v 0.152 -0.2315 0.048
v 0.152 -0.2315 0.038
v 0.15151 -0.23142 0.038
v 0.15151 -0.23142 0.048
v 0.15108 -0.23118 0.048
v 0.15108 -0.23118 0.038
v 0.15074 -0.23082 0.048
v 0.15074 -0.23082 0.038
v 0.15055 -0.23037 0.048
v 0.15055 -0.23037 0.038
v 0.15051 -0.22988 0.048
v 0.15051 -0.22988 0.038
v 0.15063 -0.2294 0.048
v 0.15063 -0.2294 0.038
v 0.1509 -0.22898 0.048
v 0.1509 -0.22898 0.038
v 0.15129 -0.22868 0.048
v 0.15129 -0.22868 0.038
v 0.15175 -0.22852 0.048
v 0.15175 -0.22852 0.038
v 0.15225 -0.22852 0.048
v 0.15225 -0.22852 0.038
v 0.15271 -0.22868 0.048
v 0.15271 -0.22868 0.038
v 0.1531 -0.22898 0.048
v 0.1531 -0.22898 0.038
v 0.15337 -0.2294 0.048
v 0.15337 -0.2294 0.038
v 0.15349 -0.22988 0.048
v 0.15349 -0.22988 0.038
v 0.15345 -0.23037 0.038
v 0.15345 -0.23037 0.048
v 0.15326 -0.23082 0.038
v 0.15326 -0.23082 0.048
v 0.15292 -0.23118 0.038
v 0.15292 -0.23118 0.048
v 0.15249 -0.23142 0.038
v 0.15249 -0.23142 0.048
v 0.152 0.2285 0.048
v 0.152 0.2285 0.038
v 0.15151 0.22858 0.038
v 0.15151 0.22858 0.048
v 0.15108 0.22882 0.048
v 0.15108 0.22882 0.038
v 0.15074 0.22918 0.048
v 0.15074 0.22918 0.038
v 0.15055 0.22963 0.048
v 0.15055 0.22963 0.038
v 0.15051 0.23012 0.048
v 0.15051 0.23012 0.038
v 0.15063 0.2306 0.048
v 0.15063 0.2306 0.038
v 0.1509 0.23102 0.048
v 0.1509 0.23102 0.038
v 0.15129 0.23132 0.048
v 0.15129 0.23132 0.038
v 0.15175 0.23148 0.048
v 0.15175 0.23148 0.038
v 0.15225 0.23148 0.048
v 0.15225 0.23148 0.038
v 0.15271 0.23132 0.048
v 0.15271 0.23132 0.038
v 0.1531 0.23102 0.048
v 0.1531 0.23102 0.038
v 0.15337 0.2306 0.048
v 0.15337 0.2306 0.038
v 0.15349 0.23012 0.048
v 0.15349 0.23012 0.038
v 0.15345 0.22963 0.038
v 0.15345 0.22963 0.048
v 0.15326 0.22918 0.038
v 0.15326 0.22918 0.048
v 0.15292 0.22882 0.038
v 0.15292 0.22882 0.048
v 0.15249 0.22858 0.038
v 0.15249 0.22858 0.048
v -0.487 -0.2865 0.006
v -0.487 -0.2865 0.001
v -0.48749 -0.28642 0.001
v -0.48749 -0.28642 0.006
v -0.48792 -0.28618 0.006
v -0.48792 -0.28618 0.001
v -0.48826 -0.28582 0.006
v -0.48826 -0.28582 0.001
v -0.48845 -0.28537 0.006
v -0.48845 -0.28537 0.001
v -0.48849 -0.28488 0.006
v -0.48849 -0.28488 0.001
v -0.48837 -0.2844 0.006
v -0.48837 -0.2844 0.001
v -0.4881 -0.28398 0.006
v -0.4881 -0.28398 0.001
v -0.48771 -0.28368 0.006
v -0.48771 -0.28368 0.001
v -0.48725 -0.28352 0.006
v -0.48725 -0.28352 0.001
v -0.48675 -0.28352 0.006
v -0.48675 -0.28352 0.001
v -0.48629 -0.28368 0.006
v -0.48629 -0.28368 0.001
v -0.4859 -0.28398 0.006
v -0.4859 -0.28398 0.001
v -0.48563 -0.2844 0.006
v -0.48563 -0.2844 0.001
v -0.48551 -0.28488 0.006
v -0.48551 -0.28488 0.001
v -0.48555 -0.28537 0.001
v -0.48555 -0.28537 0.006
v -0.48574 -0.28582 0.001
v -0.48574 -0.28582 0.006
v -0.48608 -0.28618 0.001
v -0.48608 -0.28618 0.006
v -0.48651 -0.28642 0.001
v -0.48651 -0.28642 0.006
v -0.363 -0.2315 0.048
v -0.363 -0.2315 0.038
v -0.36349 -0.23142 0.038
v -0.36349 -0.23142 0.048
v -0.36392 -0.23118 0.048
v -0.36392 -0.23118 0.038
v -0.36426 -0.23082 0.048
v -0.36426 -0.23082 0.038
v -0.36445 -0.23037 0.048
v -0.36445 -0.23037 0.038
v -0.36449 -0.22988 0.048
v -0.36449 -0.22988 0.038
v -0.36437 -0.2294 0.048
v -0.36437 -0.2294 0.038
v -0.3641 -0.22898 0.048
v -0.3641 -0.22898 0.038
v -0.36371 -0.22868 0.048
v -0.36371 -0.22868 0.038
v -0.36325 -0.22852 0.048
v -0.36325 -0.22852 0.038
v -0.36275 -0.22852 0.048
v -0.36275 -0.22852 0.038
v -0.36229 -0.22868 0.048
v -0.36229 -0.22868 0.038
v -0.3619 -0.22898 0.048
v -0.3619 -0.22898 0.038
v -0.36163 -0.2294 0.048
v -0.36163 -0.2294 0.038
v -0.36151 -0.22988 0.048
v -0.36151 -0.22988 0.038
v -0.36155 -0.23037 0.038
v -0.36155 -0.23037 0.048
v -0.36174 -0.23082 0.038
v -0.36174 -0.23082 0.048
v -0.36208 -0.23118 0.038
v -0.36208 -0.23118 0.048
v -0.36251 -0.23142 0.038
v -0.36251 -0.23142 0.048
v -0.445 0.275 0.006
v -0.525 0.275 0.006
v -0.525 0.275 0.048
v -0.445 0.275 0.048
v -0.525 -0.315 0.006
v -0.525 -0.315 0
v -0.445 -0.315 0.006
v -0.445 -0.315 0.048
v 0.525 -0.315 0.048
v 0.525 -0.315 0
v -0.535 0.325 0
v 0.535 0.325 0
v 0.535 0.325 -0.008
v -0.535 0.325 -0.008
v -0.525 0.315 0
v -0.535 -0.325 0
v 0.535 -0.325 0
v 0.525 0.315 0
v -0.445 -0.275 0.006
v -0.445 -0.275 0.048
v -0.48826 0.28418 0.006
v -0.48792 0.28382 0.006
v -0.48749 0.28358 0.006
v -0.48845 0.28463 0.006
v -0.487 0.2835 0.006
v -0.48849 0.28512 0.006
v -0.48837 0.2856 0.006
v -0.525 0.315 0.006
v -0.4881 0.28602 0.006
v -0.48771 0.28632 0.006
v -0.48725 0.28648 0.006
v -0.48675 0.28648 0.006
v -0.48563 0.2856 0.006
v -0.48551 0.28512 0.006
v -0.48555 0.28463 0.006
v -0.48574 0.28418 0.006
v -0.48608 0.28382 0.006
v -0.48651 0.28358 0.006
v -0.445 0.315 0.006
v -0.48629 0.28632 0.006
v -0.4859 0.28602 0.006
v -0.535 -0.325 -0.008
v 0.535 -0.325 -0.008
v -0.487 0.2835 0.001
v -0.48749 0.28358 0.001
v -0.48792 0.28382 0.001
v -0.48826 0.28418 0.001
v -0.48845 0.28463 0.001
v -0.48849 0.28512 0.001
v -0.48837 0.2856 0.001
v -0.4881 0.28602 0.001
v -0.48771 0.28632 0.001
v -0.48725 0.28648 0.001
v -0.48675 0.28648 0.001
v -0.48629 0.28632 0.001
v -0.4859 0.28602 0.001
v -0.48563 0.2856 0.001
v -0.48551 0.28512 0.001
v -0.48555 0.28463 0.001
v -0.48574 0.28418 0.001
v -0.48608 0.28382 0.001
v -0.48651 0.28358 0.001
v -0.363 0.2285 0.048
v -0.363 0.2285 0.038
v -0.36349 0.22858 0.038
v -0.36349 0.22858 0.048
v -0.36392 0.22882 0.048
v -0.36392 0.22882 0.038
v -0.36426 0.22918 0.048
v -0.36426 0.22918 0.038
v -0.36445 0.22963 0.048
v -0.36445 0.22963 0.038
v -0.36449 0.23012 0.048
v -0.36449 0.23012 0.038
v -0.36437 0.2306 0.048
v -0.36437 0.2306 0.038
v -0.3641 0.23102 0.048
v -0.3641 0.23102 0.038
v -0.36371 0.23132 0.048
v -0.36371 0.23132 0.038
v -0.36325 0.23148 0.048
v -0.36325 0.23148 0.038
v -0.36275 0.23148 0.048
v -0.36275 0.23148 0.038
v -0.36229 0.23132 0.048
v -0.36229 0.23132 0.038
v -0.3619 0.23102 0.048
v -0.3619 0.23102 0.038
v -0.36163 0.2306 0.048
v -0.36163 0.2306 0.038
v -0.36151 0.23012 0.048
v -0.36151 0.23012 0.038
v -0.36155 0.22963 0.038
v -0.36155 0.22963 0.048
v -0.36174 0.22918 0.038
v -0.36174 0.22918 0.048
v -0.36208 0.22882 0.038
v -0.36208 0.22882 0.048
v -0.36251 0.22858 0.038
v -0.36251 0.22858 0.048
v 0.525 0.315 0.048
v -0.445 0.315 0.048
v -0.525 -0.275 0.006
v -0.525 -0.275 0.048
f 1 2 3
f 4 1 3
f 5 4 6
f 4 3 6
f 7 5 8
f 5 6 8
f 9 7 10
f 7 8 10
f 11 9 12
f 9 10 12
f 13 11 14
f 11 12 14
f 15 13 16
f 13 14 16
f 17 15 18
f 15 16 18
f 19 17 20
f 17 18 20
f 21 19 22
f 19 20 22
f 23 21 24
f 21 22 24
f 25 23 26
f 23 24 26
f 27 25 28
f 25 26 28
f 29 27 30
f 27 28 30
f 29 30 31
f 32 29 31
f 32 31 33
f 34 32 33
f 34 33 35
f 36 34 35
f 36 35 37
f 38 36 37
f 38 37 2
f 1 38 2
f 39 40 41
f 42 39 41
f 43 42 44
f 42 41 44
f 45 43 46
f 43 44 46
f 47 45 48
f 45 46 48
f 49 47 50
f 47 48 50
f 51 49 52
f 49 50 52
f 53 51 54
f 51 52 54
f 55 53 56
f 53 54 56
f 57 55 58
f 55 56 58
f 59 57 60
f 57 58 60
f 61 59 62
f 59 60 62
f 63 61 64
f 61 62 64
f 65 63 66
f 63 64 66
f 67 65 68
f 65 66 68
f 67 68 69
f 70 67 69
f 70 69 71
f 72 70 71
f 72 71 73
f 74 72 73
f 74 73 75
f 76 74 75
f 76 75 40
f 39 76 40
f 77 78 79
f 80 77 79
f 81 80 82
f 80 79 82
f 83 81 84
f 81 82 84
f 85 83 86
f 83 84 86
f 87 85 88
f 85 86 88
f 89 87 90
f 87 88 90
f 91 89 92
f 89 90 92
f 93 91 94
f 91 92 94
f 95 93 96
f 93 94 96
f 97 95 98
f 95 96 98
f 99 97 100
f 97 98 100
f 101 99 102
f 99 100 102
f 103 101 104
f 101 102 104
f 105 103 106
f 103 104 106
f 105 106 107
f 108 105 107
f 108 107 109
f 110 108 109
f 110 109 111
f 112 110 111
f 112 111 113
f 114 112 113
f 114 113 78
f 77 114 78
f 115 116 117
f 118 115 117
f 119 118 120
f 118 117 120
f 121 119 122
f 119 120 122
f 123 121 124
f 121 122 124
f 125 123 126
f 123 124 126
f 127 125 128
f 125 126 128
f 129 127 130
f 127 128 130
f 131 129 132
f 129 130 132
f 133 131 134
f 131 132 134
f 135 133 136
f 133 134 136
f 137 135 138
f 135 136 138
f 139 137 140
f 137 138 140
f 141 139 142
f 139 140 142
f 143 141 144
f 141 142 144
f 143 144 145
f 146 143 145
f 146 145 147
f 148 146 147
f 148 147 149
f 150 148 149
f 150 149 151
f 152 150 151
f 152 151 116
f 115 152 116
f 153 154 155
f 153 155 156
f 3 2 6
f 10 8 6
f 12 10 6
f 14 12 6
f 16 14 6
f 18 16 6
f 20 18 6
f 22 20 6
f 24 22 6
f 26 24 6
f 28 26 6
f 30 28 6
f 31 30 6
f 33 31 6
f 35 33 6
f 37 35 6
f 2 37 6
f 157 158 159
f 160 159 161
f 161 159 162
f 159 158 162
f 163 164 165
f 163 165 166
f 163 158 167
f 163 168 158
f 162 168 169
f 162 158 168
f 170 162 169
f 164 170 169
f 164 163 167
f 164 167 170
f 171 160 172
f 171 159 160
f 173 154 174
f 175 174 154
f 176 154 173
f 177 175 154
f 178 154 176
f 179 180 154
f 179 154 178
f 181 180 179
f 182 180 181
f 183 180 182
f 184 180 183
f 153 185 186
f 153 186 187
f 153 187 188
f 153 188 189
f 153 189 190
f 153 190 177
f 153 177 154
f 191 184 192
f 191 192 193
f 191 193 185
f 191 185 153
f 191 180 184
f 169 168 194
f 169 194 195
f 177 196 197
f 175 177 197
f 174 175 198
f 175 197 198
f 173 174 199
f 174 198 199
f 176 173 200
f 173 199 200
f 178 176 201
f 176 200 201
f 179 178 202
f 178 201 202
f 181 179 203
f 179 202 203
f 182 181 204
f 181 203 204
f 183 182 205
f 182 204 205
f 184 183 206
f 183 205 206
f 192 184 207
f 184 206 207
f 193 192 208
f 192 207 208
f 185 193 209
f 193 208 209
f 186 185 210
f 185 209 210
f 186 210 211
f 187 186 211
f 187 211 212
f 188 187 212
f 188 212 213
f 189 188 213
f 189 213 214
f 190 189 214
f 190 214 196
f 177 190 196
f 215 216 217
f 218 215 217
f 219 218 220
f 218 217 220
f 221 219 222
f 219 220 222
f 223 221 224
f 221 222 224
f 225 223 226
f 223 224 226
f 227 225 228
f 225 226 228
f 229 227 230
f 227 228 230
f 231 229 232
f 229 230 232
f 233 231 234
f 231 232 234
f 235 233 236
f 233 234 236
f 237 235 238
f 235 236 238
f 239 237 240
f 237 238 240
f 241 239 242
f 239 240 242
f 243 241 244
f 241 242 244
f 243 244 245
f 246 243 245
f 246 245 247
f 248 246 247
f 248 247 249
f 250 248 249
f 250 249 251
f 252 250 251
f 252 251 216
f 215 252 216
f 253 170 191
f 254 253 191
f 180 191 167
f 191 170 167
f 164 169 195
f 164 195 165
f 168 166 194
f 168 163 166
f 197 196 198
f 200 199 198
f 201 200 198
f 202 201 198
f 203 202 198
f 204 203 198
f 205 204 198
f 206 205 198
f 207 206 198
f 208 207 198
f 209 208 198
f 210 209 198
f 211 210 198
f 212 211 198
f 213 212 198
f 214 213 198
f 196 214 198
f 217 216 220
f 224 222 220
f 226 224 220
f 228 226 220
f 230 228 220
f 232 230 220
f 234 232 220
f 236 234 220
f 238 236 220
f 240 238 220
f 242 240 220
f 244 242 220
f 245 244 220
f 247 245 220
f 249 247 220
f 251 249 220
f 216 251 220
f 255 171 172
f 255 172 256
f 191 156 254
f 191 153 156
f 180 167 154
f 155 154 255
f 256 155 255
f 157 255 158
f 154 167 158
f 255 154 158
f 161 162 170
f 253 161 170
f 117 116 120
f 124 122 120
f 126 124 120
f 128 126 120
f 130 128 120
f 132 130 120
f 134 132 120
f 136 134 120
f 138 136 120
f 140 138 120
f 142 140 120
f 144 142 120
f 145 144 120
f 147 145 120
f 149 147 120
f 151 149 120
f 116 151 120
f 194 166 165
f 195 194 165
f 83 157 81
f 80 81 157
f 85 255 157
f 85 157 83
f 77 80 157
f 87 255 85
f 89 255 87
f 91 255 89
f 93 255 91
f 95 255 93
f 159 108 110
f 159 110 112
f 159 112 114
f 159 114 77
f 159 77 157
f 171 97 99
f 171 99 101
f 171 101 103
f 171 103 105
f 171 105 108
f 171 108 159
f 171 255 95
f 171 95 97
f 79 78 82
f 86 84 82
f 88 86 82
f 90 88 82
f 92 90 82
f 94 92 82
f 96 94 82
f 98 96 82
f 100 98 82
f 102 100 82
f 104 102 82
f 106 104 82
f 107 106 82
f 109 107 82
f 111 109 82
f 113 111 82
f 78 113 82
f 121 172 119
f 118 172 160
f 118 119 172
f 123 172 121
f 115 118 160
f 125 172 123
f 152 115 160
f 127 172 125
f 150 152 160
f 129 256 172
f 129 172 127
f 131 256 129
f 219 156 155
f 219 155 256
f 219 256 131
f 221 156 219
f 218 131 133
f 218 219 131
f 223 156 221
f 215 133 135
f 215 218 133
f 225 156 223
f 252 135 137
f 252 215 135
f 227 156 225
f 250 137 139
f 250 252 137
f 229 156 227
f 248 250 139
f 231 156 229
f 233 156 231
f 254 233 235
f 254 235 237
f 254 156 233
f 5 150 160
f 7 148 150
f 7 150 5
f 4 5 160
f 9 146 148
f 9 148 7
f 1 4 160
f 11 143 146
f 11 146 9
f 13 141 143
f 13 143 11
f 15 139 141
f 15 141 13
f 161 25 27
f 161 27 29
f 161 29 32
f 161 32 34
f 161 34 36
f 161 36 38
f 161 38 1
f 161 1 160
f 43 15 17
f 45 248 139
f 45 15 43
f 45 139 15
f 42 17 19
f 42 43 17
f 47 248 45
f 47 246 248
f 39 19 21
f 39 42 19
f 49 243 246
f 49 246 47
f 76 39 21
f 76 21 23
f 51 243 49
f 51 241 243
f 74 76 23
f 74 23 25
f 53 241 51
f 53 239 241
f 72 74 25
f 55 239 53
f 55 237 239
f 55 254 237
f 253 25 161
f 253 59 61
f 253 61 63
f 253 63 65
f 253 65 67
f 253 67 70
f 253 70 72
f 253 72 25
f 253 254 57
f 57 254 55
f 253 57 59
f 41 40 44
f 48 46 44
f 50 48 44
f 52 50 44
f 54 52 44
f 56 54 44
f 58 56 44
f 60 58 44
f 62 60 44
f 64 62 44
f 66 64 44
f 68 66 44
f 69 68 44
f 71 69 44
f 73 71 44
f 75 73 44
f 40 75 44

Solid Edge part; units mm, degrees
sketch "Sketch1" plane through (0, 0, 0) normal (0, 0, 1) x (1, 0, 0)
  line L0 (-0.525, -0.315) -> (0.525, -0.315)
  line L1 (0.525, -0.315) -> (0.525, 0.315)
  line L2 (0.525, 0.315) -> (-0.525, 0.315)
  line L3 (-0.525, 0.315) -> (-0.525, -0.315)
  dimension "D1" = 0.63
  dimension "D2" = 1.05
extrude "Protrusion1" add sketch "Sketch1" along normal blind 0.006
sketch "Sketch2" plane through (0, 0, 0) normal (0, 0, -1) x (1, 0, 0)
  line L0 (-0.535, -0.325) -> (-0.535, 0.325)
  line L1 (-0.535, 0.325) -> (0.535, 0.325)
  line L2 (0.535, 0.325) -> (0.535, -0.325)
  line L3 (0.535, -0.325) -> (-0.535, -0.325)
extrude "Ausprägung_3" add sketch "Sketch2" along normal blind 0.008
sketch "Sketch3" plane through (0, 0, 0.006) normal (0, 0, 1) x (1, 0, 0)
  line L0 (-0.525, 0.275) -> (-0.525, -0.275)
  line L1 (-0.445, -0.275) -> (-0.525, -0.275)
  line L2 (-0.445, -0.315) -> (-0.445, -0.275)
  line L3 (-0.445, -0.315) -> (0.525, -0.315)
  line L4 (0.525, -0.315) -> (0.525, 0.315)
  line L5 (0.525, 0.315) -> (-0.445, 0.315)
  line L6 (-0.445, 0.275) -> (-0.445, 0.315)
  line L7 (-0.525, 0.275) -> (-0.445, 0.275)
  dimension "D1" = 0.04
  dimension "D2" = 0.08
extrude "Ausprägung_4" add sketch "Sketch3" along normal blind 0.042
hole "Bohrung_1" at (-0.487, -0.285, 0.006) direction (0, 0, -1) diameter 0.003 depth 0.005
hole "Hole1" at (-0.487, 0.285, 0.006) direction (0, 0, -1) diameter 0.003 depth 0.005
hole "Bohrung_3" at (-0.363, 0.23, 0.048) direction (0, 0, -1) diameter 0.003 depth 0.01
hole "Hole2" at (0.152, 0.23, 0.048) direction (0, 0, -1) diameter 0.003 depth 0.01
hole "Hole3" at (0.152, -0.23, 0.048) direction (0, 0, -1) diameter 0.003 depth 0.01
hole "Hole4" at (-0.363, -0.23, 0.048) direction (0, 0, -1) diameter 0.003 depth 0.01
